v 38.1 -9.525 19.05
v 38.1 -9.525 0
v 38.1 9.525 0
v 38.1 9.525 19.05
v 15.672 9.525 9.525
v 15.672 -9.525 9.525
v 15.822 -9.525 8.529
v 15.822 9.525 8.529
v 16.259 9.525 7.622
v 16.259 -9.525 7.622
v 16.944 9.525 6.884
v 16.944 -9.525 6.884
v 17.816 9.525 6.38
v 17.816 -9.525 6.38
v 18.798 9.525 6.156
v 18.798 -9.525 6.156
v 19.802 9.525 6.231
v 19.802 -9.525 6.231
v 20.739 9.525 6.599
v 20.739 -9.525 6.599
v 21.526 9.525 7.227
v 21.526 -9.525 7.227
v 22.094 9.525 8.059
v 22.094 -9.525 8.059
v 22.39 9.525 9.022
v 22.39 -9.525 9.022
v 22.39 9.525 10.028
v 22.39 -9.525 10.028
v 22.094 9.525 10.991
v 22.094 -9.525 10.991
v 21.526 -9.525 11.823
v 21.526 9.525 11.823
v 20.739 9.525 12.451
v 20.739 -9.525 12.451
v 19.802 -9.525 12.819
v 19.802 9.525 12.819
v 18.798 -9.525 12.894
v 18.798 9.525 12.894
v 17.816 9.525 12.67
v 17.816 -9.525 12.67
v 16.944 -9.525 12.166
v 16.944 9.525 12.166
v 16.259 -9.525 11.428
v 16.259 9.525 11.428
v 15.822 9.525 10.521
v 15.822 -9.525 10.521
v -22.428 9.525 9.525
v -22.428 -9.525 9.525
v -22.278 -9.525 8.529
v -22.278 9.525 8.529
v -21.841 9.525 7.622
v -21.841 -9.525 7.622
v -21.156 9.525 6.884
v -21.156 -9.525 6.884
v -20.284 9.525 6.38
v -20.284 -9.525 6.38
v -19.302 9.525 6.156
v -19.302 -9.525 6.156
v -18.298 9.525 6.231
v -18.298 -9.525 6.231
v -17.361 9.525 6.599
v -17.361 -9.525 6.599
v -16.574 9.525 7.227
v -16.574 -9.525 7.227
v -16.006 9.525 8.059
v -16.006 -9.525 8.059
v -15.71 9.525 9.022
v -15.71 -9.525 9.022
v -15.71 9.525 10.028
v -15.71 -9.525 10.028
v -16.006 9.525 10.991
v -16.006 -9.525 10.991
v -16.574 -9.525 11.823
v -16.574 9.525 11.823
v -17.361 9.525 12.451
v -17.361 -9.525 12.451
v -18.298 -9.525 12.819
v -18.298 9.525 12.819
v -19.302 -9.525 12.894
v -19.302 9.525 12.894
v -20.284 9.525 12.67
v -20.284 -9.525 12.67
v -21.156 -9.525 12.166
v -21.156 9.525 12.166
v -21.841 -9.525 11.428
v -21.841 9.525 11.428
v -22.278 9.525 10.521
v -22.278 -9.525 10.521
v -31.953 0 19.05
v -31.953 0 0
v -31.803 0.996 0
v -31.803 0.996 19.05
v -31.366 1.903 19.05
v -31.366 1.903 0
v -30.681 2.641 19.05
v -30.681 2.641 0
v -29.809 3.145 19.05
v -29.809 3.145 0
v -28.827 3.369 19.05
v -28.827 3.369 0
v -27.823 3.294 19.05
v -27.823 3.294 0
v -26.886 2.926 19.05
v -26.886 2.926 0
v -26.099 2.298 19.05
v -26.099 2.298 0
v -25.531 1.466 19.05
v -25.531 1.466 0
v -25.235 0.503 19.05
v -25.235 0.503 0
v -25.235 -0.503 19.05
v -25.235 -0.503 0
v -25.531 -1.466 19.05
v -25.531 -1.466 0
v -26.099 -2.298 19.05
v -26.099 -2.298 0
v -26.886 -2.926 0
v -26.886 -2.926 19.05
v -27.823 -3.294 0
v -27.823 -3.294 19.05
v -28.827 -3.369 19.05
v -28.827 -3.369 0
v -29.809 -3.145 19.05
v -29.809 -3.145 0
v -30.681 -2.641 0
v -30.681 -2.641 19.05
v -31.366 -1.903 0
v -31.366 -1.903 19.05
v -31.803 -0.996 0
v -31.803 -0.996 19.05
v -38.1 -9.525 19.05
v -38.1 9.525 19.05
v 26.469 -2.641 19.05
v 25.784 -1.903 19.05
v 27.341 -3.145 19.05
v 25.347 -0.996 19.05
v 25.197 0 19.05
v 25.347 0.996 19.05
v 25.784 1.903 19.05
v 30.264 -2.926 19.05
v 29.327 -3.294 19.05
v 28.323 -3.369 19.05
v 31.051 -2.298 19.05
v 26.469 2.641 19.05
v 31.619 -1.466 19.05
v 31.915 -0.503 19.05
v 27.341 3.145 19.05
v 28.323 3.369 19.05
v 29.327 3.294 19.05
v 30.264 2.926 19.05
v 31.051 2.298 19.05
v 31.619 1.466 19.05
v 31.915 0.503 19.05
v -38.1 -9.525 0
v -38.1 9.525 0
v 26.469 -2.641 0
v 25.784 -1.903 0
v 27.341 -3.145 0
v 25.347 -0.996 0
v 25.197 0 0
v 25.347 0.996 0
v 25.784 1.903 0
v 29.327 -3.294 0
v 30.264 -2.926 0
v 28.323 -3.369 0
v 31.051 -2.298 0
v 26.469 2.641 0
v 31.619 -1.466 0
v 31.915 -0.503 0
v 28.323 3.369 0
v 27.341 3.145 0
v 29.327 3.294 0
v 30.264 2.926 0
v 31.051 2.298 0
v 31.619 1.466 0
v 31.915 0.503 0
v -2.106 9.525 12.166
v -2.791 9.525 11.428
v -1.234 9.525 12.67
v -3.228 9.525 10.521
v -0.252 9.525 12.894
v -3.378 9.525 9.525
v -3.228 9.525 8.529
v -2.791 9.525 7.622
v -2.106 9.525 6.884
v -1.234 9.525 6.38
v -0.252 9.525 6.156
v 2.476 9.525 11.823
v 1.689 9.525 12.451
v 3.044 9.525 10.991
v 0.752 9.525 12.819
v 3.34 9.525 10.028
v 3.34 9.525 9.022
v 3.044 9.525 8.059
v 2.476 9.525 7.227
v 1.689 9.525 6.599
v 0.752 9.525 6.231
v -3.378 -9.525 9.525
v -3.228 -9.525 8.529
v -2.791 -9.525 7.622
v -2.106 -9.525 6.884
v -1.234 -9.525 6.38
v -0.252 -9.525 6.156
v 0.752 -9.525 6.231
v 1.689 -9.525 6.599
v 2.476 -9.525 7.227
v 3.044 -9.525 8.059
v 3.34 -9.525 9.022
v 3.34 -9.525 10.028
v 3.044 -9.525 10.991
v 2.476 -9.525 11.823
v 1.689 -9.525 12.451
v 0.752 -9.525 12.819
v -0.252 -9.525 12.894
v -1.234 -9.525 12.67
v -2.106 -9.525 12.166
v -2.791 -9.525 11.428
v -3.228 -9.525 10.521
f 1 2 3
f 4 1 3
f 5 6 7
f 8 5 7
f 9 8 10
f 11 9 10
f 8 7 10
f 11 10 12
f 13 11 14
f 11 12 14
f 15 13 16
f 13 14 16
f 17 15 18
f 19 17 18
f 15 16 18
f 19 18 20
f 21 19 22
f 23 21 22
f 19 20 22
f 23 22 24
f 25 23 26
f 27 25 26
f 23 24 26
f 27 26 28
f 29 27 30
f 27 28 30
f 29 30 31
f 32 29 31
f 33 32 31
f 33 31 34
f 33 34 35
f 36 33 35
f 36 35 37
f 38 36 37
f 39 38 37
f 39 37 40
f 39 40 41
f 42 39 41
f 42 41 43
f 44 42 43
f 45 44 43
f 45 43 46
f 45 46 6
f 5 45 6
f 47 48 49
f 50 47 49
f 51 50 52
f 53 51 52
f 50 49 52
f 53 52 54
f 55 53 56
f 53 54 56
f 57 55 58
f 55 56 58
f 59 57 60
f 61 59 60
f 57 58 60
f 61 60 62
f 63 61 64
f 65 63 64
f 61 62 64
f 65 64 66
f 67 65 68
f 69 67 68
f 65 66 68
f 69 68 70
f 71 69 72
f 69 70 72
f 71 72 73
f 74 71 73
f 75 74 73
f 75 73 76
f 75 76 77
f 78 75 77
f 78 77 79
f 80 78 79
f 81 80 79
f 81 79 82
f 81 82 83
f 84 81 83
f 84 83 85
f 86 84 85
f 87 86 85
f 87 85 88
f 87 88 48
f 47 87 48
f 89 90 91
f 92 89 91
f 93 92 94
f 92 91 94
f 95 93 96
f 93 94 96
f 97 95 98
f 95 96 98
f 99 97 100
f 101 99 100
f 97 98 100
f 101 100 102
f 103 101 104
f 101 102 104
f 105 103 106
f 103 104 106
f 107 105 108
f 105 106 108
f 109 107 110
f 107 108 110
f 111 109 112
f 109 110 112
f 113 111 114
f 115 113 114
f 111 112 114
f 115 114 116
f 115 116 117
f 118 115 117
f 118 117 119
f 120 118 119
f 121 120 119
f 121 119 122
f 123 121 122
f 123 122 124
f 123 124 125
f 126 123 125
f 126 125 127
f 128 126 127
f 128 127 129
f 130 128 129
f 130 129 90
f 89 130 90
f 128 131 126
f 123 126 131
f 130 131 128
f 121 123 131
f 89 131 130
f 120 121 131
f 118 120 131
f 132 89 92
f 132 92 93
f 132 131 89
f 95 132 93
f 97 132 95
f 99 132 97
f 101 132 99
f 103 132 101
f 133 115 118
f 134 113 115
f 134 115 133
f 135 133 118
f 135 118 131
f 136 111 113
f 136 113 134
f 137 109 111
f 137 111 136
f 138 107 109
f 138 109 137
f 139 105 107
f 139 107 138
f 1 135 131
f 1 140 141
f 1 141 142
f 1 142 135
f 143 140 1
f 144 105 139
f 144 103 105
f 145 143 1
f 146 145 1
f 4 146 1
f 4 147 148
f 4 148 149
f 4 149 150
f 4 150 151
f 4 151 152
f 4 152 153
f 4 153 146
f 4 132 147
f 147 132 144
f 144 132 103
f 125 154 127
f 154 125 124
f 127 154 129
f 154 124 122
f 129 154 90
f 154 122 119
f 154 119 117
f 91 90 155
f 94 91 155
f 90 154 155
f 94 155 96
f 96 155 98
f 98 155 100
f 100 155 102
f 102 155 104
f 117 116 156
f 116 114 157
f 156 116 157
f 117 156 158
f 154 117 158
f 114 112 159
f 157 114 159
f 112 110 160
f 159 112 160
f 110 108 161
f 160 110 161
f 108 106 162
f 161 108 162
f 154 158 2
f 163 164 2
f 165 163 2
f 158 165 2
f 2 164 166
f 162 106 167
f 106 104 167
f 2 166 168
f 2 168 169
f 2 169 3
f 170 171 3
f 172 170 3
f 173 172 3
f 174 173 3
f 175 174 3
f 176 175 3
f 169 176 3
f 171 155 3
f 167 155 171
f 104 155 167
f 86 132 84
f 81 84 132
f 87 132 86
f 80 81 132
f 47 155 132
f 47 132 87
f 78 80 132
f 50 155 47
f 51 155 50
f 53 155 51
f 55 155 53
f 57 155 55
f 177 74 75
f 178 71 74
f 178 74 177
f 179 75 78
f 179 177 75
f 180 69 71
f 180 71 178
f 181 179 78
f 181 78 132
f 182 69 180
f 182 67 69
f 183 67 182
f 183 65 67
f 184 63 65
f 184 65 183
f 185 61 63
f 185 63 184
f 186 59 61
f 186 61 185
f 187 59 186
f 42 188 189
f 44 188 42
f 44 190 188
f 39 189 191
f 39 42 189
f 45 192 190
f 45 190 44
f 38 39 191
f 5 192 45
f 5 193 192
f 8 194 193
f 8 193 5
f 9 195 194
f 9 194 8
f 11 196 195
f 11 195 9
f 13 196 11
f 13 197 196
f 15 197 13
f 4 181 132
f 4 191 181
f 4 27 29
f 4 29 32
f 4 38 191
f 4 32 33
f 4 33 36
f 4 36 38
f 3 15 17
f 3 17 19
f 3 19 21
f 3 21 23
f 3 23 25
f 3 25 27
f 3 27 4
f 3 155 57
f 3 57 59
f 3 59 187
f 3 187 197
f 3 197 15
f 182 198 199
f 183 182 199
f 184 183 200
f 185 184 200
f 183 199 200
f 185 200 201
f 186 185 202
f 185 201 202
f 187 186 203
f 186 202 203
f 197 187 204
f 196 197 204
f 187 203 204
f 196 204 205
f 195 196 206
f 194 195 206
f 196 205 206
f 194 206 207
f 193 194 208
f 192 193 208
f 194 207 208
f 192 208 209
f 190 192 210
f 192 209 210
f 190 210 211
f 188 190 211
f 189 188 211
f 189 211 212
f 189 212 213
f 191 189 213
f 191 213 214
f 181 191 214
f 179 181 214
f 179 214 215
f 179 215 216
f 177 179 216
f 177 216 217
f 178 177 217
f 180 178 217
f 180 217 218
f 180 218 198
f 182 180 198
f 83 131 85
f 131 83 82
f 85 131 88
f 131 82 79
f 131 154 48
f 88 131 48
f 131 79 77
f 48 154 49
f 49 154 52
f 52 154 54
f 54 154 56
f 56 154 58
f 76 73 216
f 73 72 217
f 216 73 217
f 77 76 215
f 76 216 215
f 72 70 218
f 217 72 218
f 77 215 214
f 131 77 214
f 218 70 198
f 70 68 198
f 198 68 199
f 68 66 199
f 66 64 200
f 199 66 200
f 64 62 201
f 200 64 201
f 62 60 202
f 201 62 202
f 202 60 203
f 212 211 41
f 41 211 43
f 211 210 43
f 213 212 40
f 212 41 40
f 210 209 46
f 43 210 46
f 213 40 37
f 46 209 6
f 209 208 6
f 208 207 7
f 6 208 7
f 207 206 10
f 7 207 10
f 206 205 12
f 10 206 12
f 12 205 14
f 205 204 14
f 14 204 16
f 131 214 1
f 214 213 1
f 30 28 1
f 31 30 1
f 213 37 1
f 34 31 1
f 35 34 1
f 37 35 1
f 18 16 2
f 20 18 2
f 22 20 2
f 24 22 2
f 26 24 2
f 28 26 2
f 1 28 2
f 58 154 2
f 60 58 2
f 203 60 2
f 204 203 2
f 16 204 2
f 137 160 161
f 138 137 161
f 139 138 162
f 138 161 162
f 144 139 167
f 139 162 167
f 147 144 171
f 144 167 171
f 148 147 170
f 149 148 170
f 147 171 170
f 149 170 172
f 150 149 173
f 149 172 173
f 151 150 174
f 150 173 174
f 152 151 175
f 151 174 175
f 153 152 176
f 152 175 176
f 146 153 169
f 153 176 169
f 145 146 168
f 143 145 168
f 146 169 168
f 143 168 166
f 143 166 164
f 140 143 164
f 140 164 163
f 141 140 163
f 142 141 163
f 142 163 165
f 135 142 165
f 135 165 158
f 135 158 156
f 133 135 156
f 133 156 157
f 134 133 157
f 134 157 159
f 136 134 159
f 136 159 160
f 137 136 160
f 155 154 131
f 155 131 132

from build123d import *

# Parameters (mm, degrees)
SKETCH1_W               = 76.2
SKETCH1_H               = 19.05
BOSS_EXTRUDE1_DEPTH     = 19.05
F_1_4_CLEARANCE_HOLE1_D = 6.7564
F_1_4_CLEARANCE_HOLE2_D = 6.7564


with BuildPart() as part:
    # Sketch1 → Boss-Extrude1 (new body)
    with BuildSketch(Plane.XY):
        Rectangle(SKETCH1_W, SKETCH1_H)
    extrude(amount=BOSS_EXTRUDE1_DEPTH)

    # 1/4 Clearance Hole1 (through all)
    with Locations(Plane.XY.offset(19.05)):
        with Locations((-28.575, 0), (28.575, 0)):
            Hole(F_1_4_CLEARANCE_HOLE1_D / 2)

    # 1/4 Clearance Hole2 (through all)
    with Locations(Plane(origin=(0, 9.525, 0), x_dir=(1, 0, 0), z_dir=(0, 1, 0))):
        with Locations((0, -9.525), (-19.05, -9.525), (19.05, -9.525)):
            Hole(F_1_4_CLEARANCE_HOLE2_D / 2)


solid = part.part
